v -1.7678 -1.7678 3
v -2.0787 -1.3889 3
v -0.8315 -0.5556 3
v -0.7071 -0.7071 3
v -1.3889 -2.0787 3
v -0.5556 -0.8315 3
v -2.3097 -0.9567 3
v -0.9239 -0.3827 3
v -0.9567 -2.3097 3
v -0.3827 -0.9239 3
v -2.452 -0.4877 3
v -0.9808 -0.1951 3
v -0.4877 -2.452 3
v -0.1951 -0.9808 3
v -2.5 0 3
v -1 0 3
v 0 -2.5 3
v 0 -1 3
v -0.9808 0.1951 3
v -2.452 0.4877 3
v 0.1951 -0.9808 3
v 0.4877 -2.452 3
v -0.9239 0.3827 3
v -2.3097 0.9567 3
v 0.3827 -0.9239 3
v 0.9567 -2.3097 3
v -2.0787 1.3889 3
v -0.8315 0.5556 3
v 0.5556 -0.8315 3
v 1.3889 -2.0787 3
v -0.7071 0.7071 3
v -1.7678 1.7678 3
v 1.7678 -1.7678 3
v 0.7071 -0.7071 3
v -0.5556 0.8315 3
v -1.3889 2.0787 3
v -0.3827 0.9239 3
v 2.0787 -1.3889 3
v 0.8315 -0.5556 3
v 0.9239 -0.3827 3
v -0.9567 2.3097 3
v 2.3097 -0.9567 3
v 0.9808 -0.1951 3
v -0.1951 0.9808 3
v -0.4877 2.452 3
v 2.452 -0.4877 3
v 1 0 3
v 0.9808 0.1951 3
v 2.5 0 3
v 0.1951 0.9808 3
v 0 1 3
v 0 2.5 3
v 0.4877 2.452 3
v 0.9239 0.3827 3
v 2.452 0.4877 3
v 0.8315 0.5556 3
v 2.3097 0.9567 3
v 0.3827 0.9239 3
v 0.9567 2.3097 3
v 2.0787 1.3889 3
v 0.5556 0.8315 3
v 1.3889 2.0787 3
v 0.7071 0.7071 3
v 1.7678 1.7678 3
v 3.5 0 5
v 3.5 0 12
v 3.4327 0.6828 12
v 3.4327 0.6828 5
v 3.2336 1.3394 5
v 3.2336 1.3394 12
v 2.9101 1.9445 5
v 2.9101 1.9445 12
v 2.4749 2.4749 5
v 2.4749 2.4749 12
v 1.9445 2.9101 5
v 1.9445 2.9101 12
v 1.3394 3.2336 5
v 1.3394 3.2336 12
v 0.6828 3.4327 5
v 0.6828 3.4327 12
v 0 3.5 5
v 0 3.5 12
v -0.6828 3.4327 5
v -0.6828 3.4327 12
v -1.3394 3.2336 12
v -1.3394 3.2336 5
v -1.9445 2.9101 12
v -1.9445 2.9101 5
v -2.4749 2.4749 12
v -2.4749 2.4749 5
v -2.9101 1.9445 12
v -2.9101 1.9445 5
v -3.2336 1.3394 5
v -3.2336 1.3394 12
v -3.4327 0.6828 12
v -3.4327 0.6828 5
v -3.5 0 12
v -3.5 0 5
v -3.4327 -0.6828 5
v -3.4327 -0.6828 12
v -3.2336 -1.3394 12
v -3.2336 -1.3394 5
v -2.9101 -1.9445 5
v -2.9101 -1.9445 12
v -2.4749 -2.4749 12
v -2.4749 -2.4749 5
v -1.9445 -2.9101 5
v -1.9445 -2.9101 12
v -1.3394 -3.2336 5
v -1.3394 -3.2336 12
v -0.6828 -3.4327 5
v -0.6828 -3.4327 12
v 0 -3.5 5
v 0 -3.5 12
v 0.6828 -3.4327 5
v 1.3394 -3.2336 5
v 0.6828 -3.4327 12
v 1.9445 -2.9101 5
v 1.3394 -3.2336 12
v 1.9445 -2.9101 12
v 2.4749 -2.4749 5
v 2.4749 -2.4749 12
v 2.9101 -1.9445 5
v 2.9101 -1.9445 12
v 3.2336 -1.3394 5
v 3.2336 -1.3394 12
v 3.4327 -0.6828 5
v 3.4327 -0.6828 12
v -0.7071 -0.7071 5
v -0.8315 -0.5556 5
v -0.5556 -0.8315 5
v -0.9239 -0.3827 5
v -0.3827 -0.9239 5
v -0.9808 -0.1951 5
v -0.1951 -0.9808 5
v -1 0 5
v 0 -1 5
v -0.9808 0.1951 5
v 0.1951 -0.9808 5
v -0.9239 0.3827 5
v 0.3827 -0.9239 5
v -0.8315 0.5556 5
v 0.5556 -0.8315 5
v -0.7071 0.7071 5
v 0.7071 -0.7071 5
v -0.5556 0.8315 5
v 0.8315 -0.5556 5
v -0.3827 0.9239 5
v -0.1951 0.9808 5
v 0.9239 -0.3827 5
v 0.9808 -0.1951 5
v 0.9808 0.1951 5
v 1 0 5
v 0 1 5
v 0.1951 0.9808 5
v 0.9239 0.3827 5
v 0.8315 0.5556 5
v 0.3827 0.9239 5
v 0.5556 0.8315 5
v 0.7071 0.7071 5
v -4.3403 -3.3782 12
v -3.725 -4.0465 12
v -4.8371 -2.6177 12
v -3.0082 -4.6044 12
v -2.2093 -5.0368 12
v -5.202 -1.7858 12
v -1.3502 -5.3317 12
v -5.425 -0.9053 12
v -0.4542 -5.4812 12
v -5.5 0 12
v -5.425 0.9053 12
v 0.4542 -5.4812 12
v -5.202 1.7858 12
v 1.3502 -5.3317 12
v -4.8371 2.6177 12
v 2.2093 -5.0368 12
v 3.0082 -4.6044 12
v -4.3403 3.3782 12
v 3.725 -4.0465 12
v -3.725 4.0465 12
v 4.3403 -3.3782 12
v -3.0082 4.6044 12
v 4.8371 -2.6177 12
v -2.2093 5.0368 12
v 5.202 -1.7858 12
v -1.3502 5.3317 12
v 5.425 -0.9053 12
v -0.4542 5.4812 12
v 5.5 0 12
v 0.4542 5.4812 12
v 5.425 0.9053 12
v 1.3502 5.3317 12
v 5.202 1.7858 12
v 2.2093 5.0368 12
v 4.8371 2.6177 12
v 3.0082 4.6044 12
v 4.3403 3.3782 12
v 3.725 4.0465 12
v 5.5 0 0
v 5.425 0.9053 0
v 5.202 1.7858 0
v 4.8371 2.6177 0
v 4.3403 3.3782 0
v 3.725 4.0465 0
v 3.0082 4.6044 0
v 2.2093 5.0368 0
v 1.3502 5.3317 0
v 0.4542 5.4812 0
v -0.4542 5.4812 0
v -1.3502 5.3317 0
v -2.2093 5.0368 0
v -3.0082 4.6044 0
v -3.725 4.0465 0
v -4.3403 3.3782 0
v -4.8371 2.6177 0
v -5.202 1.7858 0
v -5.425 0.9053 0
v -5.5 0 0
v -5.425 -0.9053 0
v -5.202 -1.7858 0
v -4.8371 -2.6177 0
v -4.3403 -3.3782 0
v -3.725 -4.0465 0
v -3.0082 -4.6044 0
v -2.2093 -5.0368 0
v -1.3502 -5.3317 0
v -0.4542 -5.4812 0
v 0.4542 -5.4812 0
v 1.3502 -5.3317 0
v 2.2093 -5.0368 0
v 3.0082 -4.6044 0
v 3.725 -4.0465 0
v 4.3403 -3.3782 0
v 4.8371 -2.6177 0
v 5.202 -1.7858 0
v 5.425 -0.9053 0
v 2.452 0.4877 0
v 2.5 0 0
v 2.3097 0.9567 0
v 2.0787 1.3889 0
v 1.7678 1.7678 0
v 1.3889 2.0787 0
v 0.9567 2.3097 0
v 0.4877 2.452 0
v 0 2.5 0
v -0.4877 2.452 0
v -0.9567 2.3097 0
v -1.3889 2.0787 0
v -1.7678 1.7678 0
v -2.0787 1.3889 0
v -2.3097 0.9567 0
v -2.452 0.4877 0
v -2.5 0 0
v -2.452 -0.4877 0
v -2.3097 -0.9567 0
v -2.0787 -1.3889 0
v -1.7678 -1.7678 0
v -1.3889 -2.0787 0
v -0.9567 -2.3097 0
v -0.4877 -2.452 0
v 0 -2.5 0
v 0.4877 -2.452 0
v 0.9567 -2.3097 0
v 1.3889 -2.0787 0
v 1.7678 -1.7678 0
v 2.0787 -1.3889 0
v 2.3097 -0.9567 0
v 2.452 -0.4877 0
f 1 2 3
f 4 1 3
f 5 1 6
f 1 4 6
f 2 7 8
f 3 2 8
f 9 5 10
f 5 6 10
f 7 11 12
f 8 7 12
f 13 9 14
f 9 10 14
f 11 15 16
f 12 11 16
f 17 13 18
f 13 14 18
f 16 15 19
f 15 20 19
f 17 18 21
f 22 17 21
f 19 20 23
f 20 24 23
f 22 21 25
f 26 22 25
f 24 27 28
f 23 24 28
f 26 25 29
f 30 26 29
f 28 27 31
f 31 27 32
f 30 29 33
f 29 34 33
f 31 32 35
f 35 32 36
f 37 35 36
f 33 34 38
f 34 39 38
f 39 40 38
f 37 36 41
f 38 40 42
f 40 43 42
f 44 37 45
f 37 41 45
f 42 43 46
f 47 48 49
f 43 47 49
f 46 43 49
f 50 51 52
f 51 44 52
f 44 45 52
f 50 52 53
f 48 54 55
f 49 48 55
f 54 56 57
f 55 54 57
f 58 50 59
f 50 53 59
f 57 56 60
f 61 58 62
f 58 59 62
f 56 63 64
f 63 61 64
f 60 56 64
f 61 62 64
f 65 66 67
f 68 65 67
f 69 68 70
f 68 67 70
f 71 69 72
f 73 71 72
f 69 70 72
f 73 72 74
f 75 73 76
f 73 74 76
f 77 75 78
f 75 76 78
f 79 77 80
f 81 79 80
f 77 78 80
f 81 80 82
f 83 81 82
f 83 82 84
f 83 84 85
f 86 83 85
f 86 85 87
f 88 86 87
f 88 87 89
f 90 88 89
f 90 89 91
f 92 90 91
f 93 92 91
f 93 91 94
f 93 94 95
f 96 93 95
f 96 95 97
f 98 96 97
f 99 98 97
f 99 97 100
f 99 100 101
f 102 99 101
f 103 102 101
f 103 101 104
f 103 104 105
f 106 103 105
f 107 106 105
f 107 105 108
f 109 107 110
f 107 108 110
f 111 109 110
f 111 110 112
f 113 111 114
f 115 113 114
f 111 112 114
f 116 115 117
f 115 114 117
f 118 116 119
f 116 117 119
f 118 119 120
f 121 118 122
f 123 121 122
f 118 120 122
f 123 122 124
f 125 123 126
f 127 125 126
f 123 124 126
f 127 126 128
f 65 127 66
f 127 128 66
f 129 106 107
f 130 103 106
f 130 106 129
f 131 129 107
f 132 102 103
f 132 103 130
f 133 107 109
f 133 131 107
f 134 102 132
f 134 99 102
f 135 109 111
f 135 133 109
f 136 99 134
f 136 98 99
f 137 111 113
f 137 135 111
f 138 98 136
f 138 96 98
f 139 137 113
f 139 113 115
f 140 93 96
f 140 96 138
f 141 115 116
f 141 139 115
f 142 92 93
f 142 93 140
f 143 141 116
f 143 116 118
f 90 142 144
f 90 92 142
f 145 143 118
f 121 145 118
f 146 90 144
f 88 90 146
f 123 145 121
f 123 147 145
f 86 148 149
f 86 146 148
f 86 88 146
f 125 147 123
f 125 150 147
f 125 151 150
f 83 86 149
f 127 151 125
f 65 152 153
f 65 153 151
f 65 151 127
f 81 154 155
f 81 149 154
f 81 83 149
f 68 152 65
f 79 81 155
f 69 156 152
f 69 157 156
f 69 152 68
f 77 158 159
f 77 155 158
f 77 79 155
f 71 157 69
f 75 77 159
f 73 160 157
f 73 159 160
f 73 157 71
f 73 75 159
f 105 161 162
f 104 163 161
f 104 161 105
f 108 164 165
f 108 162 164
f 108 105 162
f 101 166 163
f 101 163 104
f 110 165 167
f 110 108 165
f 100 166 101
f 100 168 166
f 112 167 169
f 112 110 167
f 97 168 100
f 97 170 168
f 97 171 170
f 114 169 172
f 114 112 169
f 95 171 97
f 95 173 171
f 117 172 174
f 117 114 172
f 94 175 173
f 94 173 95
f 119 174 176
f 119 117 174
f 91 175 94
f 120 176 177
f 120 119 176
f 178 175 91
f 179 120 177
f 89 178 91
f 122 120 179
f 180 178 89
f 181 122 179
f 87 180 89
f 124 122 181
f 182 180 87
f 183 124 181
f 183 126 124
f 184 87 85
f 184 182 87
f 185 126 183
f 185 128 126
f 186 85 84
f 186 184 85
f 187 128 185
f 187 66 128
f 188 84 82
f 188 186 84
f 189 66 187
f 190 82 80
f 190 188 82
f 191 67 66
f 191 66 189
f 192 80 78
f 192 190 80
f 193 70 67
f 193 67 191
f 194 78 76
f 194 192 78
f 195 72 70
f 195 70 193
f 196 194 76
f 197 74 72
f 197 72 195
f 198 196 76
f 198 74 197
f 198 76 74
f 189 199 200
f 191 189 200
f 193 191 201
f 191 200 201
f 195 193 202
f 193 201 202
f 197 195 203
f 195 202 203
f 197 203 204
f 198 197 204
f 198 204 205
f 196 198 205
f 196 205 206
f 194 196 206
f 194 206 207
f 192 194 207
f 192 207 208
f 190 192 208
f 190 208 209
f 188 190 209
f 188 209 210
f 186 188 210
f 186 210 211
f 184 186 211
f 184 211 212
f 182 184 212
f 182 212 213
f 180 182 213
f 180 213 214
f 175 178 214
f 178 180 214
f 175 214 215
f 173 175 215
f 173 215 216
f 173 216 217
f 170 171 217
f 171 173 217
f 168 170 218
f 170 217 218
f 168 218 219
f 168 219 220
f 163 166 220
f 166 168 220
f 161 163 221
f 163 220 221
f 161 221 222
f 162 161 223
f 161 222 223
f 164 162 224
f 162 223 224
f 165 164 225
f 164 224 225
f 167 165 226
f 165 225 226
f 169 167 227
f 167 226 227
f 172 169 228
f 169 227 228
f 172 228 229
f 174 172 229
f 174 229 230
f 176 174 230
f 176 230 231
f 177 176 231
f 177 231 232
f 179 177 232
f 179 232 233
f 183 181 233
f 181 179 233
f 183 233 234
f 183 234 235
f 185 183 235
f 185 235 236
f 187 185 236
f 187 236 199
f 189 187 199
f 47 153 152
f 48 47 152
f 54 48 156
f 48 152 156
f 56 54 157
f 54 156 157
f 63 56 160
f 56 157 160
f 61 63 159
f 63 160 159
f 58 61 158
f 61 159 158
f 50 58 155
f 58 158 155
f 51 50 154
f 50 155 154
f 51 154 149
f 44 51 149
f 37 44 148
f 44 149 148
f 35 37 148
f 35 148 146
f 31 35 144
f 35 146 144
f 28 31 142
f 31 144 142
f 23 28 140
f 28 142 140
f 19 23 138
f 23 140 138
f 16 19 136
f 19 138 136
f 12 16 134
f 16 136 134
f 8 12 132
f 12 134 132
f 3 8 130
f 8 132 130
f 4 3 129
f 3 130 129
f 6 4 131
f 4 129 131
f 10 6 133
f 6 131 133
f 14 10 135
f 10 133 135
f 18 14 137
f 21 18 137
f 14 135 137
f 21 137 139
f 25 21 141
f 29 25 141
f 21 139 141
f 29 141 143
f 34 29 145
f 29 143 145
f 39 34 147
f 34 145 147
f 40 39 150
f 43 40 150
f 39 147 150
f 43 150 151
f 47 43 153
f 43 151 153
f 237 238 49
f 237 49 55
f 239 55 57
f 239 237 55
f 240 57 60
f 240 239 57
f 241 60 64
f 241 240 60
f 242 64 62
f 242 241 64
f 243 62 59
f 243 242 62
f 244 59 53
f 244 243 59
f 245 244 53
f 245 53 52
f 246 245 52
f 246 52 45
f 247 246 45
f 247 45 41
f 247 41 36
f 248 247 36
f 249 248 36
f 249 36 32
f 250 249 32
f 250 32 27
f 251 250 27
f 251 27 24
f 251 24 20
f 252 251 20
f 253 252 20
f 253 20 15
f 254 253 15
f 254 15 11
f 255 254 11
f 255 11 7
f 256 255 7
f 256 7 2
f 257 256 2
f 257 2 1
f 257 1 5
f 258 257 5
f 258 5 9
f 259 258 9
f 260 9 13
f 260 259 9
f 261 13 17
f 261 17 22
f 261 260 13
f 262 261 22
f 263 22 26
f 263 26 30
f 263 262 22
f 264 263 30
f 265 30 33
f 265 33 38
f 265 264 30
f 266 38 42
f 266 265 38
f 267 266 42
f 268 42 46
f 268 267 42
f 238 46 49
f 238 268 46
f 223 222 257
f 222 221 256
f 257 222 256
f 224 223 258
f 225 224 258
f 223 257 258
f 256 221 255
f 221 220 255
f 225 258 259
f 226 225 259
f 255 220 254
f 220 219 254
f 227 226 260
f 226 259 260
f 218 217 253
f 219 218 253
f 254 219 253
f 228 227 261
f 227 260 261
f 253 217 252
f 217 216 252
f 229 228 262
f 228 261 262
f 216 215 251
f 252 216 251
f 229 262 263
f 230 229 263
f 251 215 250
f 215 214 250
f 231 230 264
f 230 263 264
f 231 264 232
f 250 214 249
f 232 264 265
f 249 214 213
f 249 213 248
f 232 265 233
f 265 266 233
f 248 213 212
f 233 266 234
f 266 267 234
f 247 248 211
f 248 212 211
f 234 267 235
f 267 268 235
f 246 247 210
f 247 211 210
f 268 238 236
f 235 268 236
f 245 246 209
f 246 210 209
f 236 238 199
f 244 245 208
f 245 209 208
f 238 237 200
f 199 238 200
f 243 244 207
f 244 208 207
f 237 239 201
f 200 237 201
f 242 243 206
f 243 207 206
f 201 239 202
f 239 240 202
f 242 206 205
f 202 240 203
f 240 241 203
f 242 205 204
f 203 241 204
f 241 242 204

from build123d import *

# Parameters (mm, degrees)
SKETCH1_R           = 5.5
SKETCH1_R_2         = 2.5
BOSS_EXTRUDE1_DEPTH = 20
BOSS_EXTRUDE2_START = -17
SKETCH2_R           = 2.5
BOSS_EXTRUDE2_DEPTH = 2
SKETCH3_R           = 1
CUT_EXTRUDE1_DEPTH  = 2
SKETCH4_R           = 3.5
CUT_EXTRUDE3_DEPTH  = 15
SKETCH5_R           = 6.684025948
CUT_EXTRUDE4_DEPTH  = 8


with BuildPart() as part:
    # Sketch1 → Boss-Extrude1 (new body)
    with BuildSketch(Plane.XY):
        Circle(SKETCH1_R)
        Circle(SKETCH1_R_2, mode=Mode.SUBTRACT)
    extrude(amount=BOSS_EXTRUDE1_DEPTH)

    # Sketch2 → Boss-Extrude2 (add)
    with BuildSketch(Plane.XY.offset(20).offset(BOSS_EXTRUDE2_START)):
        Circle(SKETCH2_R)
    extrude(amount=BOSS_EXTRUDE2_DEPTH)

    # Sketch3 → Cut-Extrude1 (cut)
    with BuildSketch(Plane.XY.offset(5)):
        Circle(SKETCH3_R)
    extrude(amount=-CUT_EXTRUDE1_DEPTH, mode=Mode.SUBTRACT)

    # Sketch4 → Cut-Extrude3 (cut)
    with BuildSketch(Plane.XY.offset(20)):
        Circle(SKETCH4_R)
    extrude(amount=-CUT_EXTRUDE3_DEPTH, mode=Mode.SUBTRACT)

    # Sketch5 → Cut-Extrude4 (cut)
    with BuildSketch(Plane.XY.offset(20)):
        Circle(SKETCH5_R)
    extrude(amount=-CUT_EXTRUDE4_DEPTH, mode=Mode.SUBTRACT)


solid = part.part
